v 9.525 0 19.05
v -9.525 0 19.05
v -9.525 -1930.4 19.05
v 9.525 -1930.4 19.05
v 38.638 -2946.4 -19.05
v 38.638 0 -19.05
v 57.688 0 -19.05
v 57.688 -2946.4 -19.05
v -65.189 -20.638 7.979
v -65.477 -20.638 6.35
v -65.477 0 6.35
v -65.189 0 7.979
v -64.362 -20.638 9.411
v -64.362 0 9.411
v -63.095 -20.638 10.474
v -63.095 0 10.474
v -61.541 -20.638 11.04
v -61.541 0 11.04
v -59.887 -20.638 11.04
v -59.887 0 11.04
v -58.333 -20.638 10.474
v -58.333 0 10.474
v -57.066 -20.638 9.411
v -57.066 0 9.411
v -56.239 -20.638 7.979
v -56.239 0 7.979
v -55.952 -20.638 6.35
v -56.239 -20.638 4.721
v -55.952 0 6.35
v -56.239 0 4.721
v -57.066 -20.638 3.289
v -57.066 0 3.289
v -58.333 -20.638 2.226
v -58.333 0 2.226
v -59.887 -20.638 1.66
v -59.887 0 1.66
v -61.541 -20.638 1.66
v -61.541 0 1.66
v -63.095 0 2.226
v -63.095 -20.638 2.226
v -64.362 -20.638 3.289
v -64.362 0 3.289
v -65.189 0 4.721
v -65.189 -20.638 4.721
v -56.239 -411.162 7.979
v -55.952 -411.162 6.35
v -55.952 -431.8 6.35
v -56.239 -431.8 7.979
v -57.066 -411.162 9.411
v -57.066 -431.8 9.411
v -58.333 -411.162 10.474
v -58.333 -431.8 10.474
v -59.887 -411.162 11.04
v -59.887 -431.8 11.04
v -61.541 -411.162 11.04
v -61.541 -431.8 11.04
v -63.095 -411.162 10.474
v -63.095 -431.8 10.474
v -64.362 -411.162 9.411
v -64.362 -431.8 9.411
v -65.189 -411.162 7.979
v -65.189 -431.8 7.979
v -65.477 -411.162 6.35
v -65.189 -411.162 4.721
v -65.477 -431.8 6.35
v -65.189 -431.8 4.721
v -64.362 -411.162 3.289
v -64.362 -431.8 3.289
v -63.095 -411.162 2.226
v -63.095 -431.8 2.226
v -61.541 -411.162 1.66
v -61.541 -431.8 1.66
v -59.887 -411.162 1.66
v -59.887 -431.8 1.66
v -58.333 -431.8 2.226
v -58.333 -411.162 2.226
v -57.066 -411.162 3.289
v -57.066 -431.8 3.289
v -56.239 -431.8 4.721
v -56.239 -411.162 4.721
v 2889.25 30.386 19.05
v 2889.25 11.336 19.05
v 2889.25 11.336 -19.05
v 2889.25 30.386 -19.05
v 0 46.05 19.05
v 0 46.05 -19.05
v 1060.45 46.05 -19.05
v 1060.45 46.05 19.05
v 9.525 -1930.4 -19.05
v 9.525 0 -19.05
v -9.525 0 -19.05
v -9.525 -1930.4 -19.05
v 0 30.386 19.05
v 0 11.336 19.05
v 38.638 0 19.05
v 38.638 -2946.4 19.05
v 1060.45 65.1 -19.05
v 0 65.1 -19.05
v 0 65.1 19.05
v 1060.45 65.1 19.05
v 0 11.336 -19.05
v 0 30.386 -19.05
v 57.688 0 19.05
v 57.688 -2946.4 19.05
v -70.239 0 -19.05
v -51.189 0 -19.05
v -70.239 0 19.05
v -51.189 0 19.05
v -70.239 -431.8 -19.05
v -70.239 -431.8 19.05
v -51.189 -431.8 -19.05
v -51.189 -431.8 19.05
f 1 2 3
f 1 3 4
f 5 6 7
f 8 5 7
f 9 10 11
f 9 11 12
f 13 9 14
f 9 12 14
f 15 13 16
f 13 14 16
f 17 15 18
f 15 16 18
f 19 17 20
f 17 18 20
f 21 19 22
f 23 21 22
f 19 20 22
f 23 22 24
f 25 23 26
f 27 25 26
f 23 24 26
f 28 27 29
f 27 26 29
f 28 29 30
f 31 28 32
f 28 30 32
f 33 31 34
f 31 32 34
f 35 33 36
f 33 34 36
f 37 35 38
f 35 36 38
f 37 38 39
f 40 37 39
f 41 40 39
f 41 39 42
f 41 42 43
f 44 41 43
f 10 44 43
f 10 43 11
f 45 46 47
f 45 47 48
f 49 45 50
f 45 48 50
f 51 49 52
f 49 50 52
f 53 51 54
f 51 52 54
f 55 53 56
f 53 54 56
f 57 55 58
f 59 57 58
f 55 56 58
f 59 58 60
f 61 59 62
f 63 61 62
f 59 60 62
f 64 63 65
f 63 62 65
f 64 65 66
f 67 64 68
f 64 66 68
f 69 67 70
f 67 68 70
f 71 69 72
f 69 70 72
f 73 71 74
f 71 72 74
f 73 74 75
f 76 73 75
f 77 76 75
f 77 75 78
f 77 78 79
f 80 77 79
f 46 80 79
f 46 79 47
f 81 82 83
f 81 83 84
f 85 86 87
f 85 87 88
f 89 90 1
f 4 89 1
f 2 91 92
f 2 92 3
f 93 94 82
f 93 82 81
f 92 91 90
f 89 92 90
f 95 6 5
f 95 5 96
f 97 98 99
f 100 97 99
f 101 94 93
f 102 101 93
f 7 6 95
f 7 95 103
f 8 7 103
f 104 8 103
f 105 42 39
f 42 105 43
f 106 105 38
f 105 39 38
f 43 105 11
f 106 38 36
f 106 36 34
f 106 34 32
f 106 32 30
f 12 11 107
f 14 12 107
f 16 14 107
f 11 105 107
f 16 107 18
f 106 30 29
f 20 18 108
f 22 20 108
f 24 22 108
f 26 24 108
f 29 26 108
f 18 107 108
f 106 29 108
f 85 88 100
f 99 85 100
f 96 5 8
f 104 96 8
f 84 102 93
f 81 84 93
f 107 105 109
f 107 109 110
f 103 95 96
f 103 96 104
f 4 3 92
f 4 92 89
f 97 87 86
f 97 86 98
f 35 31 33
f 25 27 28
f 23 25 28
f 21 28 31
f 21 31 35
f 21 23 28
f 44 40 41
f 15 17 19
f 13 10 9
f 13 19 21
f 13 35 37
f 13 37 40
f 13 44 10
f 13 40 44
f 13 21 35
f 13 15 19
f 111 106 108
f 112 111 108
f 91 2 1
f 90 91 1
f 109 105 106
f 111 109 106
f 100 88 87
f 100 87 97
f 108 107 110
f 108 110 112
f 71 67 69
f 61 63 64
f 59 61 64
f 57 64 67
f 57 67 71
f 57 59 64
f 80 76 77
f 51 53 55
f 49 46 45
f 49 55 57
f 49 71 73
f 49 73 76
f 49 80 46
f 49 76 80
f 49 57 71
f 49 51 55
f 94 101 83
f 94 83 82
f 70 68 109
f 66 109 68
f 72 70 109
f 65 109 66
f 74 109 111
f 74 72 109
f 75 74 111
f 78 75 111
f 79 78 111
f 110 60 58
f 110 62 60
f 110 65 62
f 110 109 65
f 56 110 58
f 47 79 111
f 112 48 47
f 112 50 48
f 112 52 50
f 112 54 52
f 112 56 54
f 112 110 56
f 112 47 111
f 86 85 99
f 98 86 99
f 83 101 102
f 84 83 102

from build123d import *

# Parameters (mm, degrees)
F0_W      = 19.05
F0_H      = 38.1
F3_DEPTH  = 431.8
F1_W      = 19.05
F1_H      = 38.1
F4_DEPTH  = 1930.4
F2_W      = 19.05
F2_H      = 38.1
F5_DEPTH  = 2946.4
F6_W      = 19.05
F6_H      = 38.1
F8_DEPTH  = 2889.25
F7_W      = 19.05
F7_H      = 38.1
F9_DEPTH  = 1060.45
F10_R     = 4.7625
F11_DEPTH = 20.6375
F12_R     = 4.7625
F13_DEPTH = 20.6375


with BuildPart() as f3:
    # F0 (on Front) → F3 (new body)
    with BuildSketch(Plane.XZ):
        with Locations((-60.714196, 0)):
            Rectangle(F0_W, F0_H)
    extrude(amount=F3_DEPTH)

    # F10 (on face) → F11 (cut)
    with BuildSketch(Plane.XZ.offset(431.8)):
        with Locations((-60.714196, 6.35)):
            Circle(F10_R)
    extrude(amount=-F11_DEPTH, mode=Mode.SUBTRACT)

    # F12 (on face) → F13 (cut)
    with BuildSketch(Plane(origin=(0, 0, 0), x_dir=(-1, 0, 0), z_dir=(0, 1, 0))):
        with Locations((60.714196, 6.35)):
            Circle(F12_R)
    extrude(amount=-F13_DEPTH, mode=Mode.SUBTRACT)


with BuildPart() as f4:
    # F1 (on Front) → F4 (new body)
    with BuildSketch(Plane.XZ):
        Rectangle(F1_W, F1_H)
    extrude(amount=F4_DEPTH)


with BuildPart() as f5:
    # F2 (on Front) → F5 (new body)
    with BuildSketch(Plane.XZ):
        with Locations((48.163462, 0)):
            Rectangle(F2_W, F2_H)
    extrude(amount=F5_DEPTH)


with BuildPart() as f8:
    # F6 (on Right) → F8 (new body)
    with BuildSketch(Plane.YZ):
        with Locations((20.861482, 0)):
            Rectangle(F6_W, F6_H)
    extrude(amount=F8_DEPTH)


with BuildPart() as f9:
    # F7 (on Right) → F9 (new body)
    with BuildSketch(Plane.YZ):
        with Locations((55.57505, 0)):
            Rectangle(F7_W, F7_H)
    extrude(amount=F9_DEPTH)


solid = Compound([f3.part, f4.part, f5.part, f8.part, f9.part])
